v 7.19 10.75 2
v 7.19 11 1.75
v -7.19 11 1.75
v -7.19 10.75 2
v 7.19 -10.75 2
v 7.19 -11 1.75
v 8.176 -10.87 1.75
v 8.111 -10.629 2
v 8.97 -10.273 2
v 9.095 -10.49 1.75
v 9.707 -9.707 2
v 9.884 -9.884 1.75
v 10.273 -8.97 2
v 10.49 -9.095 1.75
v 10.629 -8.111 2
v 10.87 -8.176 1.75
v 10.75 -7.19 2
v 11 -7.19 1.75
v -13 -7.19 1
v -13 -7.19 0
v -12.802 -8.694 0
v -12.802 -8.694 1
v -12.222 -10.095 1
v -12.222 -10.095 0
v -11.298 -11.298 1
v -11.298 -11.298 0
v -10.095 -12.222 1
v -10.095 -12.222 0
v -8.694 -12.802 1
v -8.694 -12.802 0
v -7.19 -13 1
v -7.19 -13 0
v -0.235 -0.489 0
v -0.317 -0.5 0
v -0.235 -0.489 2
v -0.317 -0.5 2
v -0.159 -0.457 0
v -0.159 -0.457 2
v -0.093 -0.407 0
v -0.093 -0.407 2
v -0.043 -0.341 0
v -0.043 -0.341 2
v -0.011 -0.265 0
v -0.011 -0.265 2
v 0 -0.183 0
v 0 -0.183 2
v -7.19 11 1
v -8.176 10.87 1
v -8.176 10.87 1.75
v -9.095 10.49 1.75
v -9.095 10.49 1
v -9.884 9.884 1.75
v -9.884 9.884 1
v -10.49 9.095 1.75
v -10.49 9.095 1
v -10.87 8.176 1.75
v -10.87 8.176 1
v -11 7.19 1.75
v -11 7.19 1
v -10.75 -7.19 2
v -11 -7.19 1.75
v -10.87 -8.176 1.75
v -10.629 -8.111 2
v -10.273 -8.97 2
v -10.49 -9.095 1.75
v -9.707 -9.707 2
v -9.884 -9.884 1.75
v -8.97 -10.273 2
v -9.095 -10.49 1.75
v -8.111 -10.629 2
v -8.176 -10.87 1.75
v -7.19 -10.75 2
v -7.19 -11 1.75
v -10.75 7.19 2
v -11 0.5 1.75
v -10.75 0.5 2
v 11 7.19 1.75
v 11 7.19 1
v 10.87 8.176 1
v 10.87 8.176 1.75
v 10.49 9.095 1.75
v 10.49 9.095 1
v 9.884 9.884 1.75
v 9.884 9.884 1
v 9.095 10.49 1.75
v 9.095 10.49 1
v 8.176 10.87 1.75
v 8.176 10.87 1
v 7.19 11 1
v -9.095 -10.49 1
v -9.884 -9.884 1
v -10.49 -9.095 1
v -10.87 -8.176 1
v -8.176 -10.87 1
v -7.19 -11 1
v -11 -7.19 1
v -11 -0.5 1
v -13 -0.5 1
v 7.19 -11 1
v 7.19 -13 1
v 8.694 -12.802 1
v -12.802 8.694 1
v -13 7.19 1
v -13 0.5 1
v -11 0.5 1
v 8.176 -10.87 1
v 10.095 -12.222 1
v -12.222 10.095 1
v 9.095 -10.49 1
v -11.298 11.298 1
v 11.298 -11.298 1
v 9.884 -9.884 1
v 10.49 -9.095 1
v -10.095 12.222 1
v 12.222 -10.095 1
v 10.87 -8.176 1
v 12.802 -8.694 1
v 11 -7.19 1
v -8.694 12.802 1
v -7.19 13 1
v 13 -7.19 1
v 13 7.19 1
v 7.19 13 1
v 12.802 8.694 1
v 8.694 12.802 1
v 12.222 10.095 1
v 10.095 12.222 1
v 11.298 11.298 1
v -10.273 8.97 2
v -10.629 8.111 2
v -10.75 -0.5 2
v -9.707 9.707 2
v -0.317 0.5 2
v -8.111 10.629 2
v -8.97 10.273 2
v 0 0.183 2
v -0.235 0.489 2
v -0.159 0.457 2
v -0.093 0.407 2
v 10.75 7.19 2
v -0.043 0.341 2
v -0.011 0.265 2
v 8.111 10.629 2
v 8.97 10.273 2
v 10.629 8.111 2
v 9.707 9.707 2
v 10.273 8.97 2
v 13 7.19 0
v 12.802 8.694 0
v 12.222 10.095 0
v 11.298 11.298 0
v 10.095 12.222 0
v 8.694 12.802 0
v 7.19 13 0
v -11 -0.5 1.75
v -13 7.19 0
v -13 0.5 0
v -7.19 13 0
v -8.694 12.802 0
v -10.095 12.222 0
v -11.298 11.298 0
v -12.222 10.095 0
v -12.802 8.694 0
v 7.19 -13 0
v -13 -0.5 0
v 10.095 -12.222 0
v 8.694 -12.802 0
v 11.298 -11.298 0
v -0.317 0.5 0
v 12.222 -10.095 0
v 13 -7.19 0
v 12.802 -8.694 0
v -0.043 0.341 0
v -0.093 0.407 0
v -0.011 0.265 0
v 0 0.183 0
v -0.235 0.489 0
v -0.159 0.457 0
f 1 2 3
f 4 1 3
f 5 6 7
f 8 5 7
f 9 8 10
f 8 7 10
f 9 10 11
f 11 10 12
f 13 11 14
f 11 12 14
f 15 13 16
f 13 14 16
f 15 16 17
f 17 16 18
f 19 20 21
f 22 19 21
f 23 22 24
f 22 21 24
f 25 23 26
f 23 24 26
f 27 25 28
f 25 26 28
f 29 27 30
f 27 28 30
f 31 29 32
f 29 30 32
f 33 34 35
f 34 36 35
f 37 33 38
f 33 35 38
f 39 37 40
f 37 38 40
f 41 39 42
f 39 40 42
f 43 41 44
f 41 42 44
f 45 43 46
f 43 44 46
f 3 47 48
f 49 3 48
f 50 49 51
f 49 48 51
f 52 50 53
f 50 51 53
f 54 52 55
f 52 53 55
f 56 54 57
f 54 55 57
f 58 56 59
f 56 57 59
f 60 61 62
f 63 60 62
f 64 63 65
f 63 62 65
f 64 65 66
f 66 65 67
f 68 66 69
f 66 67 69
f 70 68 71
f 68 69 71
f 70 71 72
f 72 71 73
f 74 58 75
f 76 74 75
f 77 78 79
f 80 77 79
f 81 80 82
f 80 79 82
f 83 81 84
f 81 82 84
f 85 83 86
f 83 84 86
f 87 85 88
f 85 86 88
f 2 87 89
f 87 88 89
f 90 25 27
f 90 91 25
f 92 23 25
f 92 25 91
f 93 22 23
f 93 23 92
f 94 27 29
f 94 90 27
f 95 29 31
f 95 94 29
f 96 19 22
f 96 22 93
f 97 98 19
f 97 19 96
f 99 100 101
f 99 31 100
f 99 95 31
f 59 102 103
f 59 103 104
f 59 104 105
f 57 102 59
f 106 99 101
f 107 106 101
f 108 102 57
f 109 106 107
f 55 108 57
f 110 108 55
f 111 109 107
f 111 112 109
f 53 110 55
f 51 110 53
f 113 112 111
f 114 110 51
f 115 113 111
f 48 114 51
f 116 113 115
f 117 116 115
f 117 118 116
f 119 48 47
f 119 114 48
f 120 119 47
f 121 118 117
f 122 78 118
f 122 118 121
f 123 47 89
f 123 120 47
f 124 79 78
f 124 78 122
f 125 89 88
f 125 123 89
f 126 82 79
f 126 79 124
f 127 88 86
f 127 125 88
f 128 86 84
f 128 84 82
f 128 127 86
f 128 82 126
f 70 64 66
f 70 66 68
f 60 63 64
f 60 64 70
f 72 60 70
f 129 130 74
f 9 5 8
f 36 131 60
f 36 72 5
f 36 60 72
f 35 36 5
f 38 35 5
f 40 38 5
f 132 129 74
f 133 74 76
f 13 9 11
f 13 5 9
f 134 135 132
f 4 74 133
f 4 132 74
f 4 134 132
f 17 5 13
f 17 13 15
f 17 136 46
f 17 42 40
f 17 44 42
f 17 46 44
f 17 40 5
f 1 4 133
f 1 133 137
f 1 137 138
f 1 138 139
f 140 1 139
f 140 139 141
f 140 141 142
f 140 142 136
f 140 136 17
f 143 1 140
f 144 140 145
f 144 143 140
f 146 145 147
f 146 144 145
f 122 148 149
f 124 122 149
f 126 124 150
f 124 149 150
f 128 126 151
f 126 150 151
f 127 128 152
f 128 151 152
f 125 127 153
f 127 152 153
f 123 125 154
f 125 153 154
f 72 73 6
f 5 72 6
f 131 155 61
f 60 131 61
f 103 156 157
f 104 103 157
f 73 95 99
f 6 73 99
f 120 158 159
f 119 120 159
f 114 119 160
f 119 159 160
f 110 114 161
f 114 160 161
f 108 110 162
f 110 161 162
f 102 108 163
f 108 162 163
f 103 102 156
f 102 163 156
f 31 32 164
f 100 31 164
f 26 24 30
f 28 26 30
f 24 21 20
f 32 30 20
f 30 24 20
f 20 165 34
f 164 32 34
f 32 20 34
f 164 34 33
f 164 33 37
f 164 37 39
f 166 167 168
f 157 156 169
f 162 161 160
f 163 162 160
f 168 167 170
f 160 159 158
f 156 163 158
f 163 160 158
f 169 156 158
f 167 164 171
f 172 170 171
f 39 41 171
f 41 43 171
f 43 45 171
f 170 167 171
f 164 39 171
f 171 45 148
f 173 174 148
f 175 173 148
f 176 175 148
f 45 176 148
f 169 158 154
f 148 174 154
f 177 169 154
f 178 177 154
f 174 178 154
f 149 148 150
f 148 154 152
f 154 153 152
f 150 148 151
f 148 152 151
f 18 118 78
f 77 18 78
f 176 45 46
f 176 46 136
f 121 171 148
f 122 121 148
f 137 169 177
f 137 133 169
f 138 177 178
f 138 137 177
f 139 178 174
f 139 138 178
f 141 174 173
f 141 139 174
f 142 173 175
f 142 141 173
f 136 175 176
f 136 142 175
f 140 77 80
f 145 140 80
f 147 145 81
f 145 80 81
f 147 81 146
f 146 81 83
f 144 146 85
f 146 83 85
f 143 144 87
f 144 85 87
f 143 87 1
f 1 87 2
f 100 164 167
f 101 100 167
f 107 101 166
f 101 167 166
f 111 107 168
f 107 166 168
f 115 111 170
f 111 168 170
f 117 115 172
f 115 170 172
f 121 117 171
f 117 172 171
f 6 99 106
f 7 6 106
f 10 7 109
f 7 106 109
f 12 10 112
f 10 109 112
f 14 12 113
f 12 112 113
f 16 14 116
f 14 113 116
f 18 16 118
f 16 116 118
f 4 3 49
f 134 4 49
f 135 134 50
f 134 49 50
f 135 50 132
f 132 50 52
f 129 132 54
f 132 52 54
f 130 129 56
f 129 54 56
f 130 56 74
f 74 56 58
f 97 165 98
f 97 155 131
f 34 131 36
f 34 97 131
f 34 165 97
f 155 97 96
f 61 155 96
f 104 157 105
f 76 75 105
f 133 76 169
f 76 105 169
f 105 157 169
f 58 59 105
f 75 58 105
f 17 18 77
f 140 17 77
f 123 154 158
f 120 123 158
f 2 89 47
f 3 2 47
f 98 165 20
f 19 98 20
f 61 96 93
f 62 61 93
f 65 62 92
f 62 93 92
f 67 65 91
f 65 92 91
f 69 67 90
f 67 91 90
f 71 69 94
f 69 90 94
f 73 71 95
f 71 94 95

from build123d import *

# Parameters (mm, degrees)
F1_DEPTH = 1
F2_DEPTH = 2
F3_W     = 13
F3_H     = 0.5
F4_DEPTH = 25.4
F5_SIZE  = 0.25
F6_R     = 0.3175


with BuildPart() as f1:
    # F0 (on Top) → F1 (new body)
    with BuildSketch(Plane.XY):
        with BuildLine():
            Line((13, -7.19), (13, 7.19))
            ThreePointArc((13, 7.19), (11.29829, 11.29829), (7.19, 13))
            Line((7.19, 13), (-7.19, 13))
            ThreePointArc((-7.19, 13), (-11.29829, 11.29829), (-13, 7.19))
            Line((-13, 7.19), (-13, -7.19))
            ThreePointArc((-13, -7.19), (-11.29829, -11.29829), (-7.19, -13))
            Line((-7.19, -13), (7.19, -13))
            ThreePointArc((7.19, -13), (11.29829, -11.29829), (13, -7.19))
        make_face()
        with BuildLine():
            ThreePointArc((-11, 7.19), (-9.884077, 9.884077), (-7.19, 11))
            Line((-7.19, 11), (7.19, 11))
            ThreePointArc((7.19, 11), (9.884077, 9.884077), (11, 7.19))
            Line((11, 7.19), (11, -7.19))
            ThreePointArc((11, -7.19), (9.884077, -9.884077), (7.19, -11))
            Line((7.19, -11), (-7.19, -11))
            ThreePointArc((-7.19, -11), (-9.884077, -9.884077), (-11, -7.19))
            Line((-11, -7.19), (-11, 7.19))
        make_face(mode=Mode.SUBTRACT)
    extrude(amount=F1_DEPTH)

    # F0 (on Top) → F2 (join)
    with BuildSketch(Plane.XY):
        with BuildLine():
            Line((7.19, 11), (-7.19, 11))
            ThreePointArc((-7.19, 11), (-9.884077, 9.884077), (-11, 7.19))
            Line((-11, 7.19), (-11, -7.19))
            ThreePointArc((-11, -7.19), (-9.884077, -9.884077), (-7.19, -11))
            Line((-7.19, -11), (7.19, -11))
            ThreePointArc((7.19, -11), (9.884077, -9.884077), (11, -7.19))
            Line((11, -7.19), (11, 7.19))
            ThreePointArc((11, 7.19), (9.884077, 9.884077), (7.19, 11))
        make_face()
    extrude(amount=F2_DEPTH)

    # F3 (on face) → F4 (cut)
    with BuildSketch(Plane.XY):
        with Locations((-6.5, -0.25)):
            Rectangle(F3_W, F3_H)
        with Locations((-6.5, 0.25)):
            Rectangle(F3_W, F3_H)
    extrude(amount=F4_DEPTH, mode=Mode.SUBTRACT)

    # F5
    f5_edges = [f1.edges().sort_by_distance(p)[0] for p in [
        (-11, -3.845, 2),
        (-11, 3.845, 2),
        (-9.884077, 9.884077, 2),
        (0, 11, 2),
        (11, 0, 2),
        (9.884077, -9.884077, 2),
        (0, -11, 2),
        (-9.884077, -9.884077, 2),
        (9.884077, 9.884077, 2),
    ]]
    chamfer(f5_edges, length=F5_SIZE)

    # F6
    f6_edges = [f1.edges().sort_by_distance(p)[0] for p in [
        (0, -0.5, 1),
        (0, 0.5, 1),
    ]]
    fillet(f6_edges, radius=F6_R)


solid = f1.part
